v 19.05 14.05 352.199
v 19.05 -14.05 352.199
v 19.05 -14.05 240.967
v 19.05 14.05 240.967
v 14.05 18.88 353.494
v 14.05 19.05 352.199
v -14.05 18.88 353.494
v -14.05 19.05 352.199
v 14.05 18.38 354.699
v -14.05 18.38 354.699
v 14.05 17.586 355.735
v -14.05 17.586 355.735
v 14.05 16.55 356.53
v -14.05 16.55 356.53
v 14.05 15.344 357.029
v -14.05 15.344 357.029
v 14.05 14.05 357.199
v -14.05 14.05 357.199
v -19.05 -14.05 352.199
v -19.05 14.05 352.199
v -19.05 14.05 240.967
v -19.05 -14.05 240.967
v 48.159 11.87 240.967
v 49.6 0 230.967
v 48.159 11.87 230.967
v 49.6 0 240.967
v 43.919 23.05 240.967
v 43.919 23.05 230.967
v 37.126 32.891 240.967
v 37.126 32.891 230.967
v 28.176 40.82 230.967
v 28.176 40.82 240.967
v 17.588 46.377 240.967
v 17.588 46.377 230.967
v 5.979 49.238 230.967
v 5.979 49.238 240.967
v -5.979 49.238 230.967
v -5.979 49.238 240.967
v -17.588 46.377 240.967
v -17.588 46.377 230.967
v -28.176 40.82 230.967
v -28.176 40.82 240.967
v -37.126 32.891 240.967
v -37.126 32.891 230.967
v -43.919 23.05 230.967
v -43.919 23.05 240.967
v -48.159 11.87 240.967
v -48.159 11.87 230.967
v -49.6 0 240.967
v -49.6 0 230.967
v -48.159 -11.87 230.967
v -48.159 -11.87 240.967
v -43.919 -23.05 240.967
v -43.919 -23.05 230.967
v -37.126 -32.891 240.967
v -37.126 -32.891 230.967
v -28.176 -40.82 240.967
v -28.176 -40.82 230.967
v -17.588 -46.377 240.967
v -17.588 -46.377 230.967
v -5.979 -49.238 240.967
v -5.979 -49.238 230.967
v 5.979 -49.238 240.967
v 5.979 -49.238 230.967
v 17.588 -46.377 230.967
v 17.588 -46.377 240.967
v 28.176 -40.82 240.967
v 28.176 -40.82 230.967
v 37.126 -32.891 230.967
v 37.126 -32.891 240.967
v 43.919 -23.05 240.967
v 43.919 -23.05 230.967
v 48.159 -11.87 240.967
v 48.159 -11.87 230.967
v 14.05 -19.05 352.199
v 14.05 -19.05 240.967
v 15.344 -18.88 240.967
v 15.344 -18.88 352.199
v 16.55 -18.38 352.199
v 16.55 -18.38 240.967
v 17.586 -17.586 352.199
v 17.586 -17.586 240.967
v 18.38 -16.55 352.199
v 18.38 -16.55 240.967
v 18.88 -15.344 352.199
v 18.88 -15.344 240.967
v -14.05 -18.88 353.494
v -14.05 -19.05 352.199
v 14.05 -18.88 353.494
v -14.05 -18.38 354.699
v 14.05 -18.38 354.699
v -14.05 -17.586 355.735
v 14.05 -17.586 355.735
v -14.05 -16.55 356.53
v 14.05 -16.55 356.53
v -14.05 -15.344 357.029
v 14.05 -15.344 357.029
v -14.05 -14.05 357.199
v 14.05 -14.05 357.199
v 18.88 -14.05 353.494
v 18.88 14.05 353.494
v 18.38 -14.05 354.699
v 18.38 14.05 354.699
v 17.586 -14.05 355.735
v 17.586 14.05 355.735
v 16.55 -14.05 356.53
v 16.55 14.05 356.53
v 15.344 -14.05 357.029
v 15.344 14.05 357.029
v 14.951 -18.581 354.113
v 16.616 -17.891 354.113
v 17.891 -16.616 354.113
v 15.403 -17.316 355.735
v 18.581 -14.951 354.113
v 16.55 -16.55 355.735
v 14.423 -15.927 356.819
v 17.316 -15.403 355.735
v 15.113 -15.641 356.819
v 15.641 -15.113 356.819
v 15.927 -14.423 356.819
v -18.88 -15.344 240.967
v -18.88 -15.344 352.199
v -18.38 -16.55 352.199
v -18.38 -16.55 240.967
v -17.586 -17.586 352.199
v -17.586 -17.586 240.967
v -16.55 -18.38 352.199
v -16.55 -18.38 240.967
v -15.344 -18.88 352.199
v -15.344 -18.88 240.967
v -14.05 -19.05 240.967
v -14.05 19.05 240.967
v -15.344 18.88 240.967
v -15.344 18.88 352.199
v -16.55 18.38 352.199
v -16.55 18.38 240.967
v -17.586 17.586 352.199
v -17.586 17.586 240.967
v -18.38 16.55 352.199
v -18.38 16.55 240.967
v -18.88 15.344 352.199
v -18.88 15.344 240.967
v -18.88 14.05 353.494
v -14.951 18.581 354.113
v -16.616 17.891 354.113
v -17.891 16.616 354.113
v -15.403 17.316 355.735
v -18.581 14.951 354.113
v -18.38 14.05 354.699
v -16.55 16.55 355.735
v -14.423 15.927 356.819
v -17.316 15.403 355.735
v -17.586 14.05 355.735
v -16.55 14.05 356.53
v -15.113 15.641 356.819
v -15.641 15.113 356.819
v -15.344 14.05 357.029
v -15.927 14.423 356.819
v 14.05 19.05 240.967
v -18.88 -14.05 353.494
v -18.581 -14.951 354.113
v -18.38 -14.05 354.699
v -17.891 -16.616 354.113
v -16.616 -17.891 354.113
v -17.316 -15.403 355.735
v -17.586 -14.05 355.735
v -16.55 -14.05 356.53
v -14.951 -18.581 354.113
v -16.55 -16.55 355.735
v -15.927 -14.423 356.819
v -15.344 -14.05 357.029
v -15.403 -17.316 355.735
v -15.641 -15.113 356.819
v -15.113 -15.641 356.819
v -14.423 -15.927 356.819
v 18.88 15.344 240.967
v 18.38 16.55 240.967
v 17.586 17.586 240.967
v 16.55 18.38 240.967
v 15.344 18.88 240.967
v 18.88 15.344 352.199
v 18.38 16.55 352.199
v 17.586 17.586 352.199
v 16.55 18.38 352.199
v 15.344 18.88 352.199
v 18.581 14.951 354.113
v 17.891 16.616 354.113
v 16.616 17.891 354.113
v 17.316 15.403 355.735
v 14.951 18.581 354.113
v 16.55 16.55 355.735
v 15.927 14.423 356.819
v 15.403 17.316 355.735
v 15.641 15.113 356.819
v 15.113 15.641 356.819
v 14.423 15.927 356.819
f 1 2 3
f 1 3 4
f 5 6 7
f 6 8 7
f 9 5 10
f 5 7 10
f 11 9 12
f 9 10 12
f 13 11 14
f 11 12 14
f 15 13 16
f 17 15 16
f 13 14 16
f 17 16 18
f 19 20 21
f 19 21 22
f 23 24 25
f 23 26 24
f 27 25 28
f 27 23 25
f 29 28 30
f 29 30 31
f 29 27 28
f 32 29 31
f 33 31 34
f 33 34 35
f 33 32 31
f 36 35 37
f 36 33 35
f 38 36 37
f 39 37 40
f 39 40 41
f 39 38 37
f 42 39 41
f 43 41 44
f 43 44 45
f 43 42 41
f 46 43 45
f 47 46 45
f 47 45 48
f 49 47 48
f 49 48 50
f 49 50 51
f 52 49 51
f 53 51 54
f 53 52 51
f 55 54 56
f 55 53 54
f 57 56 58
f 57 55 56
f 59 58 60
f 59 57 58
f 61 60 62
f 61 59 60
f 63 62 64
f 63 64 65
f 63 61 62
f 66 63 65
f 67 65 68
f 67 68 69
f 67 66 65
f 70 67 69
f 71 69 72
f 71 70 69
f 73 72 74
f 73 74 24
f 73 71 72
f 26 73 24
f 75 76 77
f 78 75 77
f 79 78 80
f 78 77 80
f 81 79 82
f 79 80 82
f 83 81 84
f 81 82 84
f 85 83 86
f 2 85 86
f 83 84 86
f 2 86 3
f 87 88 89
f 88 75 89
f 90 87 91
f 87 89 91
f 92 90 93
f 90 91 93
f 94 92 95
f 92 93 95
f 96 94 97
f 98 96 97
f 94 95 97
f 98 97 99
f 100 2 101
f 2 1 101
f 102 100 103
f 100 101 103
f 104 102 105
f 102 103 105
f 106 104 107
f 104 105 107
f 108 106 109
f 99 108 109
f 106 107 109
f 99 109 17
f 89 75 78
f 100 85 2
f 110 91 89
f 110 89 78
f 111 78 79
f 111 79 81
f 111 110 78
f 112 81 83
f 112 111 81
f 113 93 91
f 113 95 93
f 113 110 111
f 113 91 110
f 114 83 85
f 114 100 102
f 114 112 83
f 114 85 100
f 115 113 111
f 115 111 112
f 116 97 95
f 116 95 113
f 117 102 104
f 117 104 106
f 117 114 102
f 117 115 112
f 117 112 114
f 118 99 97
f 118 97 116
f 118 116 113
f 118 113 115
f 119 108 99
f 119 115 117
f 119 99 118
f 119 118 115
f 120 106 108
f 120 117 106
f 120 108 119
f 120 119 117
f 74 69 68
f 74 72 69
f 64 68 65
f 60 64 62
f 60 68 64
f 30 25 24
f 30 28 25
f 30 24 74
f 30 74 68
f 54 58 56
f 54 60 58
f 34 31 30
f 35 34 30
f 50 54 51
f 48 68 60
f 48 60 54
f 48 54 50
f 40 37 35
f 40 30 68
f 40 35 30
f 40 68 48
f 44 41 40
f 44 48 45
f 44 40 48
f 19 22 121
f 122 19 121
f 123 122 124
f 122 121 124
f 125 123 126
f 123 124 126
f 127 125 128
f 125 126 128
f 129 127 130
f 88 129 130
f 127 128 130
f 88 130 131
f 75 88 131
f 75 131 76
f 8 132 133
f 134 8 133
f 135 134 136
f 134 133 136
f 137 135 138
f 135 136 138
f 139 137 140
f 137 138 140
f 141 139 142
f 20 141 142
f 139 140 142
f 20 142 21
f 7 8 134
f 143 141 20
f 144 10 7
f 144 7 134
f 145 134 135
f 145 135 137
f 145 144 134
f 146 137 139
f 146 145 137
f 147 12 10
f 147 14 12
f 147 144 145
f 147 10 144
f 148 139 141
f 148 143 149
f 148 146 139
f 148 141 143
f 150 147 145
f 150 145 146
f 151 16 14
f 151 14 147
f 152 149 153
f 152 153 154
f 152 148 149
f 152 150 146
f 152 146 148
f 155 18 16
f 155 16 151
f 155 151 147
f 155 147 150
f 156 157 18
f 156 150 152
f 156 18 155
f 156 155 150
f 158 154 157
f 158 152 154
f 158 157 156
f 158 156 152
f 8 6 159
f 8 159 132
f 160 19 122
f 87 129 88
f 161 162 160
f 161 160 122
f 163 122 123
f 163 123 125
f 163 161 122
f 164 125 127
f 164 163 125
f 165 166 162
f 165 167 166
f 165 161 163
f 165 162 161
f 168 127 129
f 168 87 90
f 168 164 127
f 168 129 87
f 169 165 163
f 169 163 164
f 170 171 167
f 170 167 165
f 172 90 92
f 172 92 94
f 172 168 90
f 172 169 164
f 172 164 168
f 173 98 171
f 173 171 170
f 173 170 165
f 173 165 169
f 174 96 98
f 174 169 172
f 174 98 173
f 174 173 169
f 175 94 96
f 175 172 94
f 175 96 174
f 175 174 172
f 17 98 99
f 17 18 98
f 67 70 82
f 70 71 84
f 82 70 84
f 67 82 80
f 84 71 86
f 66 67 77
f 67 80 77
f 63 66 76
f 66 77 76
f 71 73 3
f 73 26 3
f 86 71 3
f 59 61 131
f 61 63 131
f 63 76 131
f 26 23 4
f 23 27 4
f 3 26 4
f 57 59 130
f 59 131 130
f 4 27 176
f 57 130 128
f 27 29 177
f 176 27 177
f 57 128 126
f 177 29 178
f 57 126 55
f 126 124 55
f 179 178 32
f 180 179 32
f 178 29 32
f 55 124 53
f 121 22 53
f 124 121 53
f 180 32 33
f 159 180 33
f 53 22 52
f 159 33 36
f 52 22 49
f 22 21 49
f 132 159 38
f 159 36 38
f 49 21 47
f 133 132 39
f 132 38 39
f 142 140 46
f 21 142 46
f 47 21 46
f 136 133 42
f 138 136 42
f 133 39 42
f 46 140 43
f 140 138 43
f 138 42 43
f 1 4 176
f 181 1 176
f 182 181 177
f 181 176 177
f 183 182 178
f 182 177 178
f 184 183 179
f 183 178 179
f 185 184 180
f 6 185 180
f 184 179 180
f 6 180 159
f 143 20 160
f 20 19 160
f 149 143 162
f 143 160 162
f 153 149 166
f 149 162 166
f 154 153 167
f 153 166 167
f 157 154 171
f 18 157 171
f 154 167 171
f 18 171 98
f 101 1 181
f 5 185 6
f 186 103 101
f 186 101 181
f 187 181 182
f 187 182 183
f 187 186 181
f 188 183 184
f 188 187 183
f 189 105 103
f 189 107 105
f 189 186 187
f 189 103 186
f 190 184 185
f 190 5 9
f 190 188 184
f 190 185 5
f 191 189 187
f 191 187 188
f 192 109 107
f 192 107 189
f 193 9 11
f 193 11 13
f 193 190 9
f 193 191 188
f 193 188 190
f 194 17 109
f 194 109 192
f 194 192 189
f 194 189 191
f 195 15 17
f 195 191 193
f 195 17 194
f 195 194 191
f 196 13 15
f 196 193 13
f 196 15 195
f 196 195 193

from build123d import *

# Parameters (mm, degrees)
F0_W     = 49.6
F0_H     = 10
F3_DEPTH = 116.232
F4_R     = 5


with BuildPart() as f1:
    # F0 (on Front) → F1 (revolve)
    with BuildSketch(Plane.XZ):
        with Locations((24.8, 235.9674370289)):
            Rectangle(F0_W, F0_H)
    revolve(axis=Axis((0, 0, 235.9674370289), (0, 0, 1)))

    # F2 (on face) → F3 (join)
    with BuildSketch(Plane.XY.offset(240.9674370289)):
        with BuildLine():
            ThreePointArc((19.05, 14.05), (17.5855339059, 17.5855339059), (14.05, 19.05))
            Line((14.05, 19.05), (-14.05, 19.05))
            ThreePointArc((-14.05, 19.05), (-17.5855339059, 17.5855339059), (-19.05, 14.05))
            Line((-19.05, 14.05), (-19.05, -14.05))
            ThreePointArc((-19.05, -14.05), (-17.5855339059, -17.5855339059), (-14.05, -19.05))
            Line((-14.05, -19.05), (14.05, -19.05))
            ThreePointArc((14.05, -19.05), (17.5855339059, -17.5855339059), (19.05, -14.05))
            Line((19.05, -14.05), (19.05, 14.05))
        make_face()
    extrude(amount=F3_DEPTH)

    # F4
    f4_edges = [f1.edges().sort_by_distance(p)[0] for p in [
        (0, -19.05, 357.199437),
    ]]
    fillet(f4_edges, radius=F4_R)


solid = f1.part
